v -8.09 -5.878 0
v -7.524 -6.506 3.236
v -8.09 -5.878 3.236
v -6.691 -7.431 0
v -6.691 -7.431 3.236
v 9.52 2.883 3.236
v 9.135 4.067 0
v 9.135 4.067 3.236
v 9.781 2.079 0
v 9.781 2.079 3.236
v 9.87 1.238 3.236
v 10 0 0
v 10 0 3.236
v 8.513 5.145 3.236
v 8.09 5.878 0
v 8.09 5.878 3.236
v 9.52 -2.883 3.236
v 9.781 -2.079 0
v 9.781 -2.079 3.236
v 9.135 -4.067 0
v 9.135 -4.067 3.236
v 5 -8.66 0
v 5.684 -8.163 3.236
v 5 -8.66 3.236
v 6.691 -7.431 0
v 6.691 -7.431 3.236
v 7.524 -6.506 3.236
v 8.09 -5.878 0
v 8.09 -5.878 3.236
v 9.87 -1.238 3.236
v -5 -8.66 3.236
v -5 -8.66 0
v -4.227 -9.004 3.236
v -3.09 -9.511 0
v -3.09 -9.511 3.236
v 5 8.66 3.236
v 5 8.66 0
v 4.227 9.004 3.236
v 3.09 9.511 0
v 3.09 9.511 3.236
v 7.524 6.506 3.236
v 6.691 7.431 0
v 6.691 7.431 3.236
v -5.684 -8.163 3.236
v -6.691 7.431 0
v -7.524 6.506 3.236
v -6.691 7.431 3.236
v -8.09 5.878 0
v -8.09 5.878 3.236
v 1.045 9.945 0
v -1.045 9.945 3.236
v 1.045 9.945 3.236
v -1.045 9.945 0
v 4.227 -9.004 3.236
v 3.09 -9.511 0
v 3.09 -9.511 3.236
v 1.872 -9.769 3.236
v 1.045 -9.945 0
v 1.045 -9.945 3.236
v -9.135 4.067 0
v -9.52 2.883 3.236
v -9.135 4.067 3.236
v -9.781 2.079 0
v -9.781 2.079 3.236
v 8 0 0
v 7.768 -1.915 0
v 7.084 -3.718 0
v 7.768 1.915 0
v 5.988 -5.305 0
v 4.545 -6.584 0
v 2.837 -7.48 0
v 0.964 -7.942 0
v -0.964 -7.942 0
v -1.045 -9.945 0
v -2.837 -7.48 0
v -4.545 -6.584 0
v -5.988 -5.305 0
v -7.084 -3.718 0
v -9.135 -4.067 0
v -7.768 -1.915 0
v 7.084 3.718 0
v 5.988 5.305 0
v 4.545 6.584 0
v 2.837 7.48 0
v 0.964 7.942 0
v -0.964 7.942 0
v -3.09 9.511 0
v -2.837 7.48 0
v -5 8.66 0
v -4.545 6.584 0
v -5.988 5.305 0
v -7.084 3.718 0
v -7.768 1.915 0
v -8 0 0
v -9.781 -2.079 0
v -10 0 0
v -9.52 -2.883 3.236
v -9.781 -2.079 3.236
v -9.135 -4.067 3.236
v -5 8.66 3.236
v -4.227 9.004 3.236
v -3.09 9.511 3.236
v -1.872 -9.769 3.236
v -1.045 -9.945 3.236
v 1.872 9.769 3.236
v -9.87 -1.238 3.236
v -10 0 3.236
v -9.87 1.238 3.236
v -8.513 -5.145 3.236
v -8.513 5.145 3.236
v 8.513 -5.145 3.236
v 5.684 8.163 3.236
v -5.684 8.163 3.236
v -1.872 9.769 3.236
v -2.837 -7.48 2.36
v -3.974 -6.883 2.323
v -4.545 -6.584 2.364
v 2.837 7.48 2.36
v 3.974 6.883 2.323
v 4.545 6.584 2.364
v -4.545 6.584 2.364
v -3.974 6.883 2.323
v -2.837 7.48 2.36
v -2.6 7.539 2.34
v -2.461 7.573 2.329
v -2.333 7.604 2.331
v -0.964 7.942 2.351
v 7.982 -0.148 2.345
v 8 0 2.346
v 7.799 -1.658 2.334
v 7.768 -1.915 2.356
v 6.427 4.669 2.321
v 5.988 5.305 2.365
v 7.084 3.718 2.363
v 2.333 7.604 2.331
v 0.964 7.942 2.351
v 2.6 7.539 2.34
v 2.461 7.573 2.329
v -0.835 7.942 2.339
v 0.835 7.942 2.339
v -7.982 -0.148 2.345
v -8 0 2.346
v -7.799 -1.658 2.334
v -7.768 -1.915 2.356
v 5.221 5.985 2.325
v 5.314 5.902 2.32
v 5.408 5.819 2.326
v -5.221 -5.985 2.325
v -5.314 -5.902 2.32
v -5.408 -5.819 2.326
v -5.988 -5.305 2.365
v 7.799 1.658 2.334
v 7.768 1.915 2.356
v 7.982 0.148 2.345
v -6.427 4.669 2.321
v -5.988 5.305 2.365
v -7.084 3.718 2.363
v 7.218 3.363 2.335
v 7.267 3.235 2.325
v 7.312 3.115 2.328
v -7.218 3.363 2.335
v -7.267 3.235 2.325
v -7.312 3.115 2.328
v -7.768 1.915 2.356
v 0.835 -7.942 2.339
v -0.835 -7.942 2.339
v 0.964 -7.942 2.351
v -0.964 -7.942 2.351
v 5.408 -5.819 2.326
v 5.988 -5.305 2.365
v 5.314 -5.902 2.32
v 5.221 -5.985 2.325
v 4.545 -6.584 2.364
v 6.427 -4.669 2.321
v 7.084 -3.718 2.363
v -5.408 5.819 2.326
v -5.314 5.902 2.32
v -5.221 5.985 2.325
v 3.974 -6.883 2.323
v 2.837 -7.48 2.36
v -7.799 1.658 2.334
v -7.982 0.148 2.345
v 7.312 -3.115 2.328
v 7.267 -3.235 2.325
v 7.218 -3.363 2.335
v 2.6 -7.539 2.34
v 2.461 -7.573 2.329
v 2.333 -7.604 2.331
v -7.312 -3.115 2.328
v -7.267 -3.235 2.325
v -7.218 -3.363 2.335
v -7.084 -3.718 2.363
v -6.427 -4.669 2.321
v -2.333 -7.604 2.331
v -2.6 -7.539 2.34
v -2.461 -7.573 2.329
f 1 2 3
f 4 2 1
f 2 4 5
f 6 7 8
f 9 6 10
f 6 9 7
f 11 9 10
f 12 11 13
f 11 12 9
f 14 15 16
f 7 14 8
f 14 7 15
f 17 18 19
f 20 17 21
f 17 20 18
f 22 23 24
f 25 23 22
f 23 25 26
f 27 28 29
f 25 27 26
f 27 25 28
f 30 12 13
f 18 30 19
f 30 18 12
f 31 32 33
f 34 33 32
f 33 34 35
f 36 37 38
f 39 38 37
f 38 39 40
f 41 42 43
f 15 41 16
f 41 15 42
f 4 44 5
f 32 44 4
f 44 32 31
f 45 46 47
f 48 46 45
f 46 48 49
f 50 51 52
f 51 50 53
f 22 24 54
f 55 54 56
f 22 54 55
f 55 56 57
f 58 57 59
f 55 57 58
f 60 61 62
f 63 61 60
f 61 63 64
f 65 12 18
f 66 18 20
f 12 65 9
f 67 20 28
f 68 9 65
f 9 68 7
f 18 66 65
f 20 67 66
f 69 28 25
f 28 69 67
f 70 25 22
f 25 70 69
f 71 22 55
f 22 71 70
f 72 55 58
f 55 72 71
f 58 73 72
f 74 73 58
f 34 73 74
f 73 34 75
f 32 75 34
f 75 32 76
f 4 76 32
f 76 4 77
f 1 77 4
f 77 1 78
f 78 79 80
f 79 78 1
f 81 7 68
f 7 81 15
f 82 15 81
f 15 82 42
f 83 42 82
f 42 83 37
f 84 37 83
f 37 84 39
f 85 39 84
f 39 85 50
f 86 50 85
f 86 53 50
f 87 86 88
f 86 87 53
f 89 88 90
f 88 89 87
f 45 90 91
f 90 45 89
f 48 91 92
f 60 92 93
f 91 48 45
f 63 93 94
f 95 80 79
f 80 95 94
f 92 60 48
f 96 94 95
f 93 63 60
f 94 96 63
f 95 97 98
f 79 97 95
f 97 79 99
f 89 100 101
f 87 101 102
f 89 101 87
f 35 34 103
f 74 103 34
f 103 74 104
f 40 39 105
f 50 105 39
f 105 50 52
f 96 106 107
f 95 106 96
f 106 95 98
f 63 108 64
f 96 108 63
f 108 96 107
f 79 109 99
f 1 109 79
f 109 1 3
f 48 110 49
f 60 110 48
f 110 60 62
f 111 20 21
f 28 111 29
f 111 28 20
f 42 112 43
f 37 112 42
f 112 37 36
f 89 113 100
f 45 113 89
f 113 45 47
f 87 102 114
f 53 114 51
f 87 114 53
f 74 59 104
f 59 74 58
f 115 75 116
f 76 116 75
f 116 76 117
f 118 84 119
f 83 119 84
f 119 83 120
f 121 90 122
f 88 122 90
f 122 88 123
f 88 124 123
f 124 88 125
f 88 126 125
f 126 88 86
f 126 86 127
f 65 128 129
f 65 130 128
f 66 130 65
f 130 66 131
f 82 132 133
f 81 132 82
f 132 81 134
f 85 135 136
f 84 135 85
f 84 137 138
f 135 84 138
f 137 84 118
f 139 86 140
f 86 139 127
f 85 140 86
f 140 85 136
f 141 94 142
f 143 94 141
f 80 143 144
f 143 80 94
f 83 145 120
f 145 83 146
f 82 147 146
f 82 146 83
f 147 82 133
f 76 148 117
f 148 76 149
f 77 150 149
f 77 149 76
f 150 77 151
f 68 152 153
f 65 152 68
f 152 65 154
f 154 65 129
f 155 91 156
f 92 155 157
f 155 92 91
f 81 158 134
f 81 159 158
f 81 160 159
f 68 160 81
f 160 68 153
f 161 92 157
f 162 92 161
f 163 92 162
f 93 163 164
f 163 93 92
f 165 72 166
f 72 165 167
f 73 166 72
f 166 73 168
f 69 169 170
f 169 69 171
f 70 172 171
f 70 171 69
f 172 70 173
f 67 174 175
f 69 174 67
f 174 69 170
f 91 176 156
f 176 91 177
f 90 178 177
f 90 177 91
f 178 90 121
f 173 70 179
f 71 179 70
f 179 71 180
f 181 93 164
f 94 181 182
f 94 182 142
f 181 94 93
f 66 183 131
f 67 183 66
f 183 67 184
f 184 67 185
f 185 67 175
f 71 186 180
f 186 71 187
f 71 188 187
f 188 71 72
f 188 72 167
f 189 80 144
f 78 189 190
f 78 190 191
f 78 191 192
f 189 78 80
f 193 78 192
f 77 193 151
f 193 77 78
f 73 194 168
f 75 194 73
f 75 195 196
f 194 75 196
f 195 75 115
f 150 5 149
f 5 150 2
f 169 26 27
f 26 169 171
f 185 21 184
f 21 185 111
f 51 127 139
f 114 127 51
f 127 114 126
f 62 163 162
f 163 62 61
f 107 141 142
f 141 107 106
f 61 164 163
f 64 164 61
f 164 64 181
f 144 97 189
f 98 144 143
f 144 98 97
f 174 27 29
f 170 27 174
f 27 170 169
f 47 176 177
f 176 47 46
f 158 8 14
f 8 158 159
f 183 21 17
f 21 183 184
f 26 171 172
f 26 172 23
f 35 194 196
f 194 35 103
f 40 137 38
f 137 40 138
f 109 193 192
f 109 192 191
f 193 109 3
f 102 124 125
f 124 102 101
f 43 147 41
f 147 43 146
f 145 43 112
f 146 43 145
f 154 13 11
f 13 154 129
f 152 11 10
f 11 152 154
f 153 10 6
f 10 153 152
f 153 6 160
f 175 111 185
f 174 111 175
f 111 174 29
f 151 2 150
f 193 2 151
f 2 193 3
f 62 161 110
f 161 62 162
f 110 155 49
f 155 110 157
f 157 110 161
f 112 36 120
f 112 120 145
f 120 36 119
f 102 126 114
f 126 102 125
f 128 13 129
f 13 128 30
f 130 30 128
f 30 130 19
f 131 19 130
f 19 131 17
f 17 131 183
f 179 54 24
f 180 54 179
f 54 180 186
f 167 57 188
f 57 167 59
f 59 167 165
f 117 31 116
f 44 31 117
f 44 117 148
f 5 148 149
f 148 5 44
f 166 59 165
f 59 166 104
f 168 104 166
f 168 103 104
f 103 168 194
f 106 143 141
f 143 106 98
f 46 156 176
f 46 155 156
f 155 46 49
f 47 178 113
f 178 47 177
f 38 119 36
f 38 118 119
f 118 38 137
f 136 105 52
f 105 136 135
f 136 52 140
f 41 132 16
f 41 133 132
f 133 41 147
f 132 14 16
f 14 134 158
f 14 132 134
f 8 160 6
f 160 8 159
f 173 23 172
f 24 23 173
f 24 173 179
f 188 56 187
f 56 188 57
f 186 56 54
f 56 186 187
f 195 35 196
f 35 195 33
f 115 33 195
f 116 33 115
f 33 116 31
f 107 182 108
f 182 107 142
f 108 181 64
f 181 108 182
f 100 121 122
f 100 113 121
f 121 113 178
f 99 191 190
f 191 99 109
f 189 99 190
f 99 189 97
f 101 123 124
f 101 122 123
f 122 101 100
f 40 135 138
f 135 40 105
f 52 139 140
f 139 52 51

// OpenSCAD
difference() {
	cylinder(r = 10, h = 10);
	cylinder(r = 8, h = 11);
	translate([0, 0, 25 + 1]) sphere(r = 25);
}
